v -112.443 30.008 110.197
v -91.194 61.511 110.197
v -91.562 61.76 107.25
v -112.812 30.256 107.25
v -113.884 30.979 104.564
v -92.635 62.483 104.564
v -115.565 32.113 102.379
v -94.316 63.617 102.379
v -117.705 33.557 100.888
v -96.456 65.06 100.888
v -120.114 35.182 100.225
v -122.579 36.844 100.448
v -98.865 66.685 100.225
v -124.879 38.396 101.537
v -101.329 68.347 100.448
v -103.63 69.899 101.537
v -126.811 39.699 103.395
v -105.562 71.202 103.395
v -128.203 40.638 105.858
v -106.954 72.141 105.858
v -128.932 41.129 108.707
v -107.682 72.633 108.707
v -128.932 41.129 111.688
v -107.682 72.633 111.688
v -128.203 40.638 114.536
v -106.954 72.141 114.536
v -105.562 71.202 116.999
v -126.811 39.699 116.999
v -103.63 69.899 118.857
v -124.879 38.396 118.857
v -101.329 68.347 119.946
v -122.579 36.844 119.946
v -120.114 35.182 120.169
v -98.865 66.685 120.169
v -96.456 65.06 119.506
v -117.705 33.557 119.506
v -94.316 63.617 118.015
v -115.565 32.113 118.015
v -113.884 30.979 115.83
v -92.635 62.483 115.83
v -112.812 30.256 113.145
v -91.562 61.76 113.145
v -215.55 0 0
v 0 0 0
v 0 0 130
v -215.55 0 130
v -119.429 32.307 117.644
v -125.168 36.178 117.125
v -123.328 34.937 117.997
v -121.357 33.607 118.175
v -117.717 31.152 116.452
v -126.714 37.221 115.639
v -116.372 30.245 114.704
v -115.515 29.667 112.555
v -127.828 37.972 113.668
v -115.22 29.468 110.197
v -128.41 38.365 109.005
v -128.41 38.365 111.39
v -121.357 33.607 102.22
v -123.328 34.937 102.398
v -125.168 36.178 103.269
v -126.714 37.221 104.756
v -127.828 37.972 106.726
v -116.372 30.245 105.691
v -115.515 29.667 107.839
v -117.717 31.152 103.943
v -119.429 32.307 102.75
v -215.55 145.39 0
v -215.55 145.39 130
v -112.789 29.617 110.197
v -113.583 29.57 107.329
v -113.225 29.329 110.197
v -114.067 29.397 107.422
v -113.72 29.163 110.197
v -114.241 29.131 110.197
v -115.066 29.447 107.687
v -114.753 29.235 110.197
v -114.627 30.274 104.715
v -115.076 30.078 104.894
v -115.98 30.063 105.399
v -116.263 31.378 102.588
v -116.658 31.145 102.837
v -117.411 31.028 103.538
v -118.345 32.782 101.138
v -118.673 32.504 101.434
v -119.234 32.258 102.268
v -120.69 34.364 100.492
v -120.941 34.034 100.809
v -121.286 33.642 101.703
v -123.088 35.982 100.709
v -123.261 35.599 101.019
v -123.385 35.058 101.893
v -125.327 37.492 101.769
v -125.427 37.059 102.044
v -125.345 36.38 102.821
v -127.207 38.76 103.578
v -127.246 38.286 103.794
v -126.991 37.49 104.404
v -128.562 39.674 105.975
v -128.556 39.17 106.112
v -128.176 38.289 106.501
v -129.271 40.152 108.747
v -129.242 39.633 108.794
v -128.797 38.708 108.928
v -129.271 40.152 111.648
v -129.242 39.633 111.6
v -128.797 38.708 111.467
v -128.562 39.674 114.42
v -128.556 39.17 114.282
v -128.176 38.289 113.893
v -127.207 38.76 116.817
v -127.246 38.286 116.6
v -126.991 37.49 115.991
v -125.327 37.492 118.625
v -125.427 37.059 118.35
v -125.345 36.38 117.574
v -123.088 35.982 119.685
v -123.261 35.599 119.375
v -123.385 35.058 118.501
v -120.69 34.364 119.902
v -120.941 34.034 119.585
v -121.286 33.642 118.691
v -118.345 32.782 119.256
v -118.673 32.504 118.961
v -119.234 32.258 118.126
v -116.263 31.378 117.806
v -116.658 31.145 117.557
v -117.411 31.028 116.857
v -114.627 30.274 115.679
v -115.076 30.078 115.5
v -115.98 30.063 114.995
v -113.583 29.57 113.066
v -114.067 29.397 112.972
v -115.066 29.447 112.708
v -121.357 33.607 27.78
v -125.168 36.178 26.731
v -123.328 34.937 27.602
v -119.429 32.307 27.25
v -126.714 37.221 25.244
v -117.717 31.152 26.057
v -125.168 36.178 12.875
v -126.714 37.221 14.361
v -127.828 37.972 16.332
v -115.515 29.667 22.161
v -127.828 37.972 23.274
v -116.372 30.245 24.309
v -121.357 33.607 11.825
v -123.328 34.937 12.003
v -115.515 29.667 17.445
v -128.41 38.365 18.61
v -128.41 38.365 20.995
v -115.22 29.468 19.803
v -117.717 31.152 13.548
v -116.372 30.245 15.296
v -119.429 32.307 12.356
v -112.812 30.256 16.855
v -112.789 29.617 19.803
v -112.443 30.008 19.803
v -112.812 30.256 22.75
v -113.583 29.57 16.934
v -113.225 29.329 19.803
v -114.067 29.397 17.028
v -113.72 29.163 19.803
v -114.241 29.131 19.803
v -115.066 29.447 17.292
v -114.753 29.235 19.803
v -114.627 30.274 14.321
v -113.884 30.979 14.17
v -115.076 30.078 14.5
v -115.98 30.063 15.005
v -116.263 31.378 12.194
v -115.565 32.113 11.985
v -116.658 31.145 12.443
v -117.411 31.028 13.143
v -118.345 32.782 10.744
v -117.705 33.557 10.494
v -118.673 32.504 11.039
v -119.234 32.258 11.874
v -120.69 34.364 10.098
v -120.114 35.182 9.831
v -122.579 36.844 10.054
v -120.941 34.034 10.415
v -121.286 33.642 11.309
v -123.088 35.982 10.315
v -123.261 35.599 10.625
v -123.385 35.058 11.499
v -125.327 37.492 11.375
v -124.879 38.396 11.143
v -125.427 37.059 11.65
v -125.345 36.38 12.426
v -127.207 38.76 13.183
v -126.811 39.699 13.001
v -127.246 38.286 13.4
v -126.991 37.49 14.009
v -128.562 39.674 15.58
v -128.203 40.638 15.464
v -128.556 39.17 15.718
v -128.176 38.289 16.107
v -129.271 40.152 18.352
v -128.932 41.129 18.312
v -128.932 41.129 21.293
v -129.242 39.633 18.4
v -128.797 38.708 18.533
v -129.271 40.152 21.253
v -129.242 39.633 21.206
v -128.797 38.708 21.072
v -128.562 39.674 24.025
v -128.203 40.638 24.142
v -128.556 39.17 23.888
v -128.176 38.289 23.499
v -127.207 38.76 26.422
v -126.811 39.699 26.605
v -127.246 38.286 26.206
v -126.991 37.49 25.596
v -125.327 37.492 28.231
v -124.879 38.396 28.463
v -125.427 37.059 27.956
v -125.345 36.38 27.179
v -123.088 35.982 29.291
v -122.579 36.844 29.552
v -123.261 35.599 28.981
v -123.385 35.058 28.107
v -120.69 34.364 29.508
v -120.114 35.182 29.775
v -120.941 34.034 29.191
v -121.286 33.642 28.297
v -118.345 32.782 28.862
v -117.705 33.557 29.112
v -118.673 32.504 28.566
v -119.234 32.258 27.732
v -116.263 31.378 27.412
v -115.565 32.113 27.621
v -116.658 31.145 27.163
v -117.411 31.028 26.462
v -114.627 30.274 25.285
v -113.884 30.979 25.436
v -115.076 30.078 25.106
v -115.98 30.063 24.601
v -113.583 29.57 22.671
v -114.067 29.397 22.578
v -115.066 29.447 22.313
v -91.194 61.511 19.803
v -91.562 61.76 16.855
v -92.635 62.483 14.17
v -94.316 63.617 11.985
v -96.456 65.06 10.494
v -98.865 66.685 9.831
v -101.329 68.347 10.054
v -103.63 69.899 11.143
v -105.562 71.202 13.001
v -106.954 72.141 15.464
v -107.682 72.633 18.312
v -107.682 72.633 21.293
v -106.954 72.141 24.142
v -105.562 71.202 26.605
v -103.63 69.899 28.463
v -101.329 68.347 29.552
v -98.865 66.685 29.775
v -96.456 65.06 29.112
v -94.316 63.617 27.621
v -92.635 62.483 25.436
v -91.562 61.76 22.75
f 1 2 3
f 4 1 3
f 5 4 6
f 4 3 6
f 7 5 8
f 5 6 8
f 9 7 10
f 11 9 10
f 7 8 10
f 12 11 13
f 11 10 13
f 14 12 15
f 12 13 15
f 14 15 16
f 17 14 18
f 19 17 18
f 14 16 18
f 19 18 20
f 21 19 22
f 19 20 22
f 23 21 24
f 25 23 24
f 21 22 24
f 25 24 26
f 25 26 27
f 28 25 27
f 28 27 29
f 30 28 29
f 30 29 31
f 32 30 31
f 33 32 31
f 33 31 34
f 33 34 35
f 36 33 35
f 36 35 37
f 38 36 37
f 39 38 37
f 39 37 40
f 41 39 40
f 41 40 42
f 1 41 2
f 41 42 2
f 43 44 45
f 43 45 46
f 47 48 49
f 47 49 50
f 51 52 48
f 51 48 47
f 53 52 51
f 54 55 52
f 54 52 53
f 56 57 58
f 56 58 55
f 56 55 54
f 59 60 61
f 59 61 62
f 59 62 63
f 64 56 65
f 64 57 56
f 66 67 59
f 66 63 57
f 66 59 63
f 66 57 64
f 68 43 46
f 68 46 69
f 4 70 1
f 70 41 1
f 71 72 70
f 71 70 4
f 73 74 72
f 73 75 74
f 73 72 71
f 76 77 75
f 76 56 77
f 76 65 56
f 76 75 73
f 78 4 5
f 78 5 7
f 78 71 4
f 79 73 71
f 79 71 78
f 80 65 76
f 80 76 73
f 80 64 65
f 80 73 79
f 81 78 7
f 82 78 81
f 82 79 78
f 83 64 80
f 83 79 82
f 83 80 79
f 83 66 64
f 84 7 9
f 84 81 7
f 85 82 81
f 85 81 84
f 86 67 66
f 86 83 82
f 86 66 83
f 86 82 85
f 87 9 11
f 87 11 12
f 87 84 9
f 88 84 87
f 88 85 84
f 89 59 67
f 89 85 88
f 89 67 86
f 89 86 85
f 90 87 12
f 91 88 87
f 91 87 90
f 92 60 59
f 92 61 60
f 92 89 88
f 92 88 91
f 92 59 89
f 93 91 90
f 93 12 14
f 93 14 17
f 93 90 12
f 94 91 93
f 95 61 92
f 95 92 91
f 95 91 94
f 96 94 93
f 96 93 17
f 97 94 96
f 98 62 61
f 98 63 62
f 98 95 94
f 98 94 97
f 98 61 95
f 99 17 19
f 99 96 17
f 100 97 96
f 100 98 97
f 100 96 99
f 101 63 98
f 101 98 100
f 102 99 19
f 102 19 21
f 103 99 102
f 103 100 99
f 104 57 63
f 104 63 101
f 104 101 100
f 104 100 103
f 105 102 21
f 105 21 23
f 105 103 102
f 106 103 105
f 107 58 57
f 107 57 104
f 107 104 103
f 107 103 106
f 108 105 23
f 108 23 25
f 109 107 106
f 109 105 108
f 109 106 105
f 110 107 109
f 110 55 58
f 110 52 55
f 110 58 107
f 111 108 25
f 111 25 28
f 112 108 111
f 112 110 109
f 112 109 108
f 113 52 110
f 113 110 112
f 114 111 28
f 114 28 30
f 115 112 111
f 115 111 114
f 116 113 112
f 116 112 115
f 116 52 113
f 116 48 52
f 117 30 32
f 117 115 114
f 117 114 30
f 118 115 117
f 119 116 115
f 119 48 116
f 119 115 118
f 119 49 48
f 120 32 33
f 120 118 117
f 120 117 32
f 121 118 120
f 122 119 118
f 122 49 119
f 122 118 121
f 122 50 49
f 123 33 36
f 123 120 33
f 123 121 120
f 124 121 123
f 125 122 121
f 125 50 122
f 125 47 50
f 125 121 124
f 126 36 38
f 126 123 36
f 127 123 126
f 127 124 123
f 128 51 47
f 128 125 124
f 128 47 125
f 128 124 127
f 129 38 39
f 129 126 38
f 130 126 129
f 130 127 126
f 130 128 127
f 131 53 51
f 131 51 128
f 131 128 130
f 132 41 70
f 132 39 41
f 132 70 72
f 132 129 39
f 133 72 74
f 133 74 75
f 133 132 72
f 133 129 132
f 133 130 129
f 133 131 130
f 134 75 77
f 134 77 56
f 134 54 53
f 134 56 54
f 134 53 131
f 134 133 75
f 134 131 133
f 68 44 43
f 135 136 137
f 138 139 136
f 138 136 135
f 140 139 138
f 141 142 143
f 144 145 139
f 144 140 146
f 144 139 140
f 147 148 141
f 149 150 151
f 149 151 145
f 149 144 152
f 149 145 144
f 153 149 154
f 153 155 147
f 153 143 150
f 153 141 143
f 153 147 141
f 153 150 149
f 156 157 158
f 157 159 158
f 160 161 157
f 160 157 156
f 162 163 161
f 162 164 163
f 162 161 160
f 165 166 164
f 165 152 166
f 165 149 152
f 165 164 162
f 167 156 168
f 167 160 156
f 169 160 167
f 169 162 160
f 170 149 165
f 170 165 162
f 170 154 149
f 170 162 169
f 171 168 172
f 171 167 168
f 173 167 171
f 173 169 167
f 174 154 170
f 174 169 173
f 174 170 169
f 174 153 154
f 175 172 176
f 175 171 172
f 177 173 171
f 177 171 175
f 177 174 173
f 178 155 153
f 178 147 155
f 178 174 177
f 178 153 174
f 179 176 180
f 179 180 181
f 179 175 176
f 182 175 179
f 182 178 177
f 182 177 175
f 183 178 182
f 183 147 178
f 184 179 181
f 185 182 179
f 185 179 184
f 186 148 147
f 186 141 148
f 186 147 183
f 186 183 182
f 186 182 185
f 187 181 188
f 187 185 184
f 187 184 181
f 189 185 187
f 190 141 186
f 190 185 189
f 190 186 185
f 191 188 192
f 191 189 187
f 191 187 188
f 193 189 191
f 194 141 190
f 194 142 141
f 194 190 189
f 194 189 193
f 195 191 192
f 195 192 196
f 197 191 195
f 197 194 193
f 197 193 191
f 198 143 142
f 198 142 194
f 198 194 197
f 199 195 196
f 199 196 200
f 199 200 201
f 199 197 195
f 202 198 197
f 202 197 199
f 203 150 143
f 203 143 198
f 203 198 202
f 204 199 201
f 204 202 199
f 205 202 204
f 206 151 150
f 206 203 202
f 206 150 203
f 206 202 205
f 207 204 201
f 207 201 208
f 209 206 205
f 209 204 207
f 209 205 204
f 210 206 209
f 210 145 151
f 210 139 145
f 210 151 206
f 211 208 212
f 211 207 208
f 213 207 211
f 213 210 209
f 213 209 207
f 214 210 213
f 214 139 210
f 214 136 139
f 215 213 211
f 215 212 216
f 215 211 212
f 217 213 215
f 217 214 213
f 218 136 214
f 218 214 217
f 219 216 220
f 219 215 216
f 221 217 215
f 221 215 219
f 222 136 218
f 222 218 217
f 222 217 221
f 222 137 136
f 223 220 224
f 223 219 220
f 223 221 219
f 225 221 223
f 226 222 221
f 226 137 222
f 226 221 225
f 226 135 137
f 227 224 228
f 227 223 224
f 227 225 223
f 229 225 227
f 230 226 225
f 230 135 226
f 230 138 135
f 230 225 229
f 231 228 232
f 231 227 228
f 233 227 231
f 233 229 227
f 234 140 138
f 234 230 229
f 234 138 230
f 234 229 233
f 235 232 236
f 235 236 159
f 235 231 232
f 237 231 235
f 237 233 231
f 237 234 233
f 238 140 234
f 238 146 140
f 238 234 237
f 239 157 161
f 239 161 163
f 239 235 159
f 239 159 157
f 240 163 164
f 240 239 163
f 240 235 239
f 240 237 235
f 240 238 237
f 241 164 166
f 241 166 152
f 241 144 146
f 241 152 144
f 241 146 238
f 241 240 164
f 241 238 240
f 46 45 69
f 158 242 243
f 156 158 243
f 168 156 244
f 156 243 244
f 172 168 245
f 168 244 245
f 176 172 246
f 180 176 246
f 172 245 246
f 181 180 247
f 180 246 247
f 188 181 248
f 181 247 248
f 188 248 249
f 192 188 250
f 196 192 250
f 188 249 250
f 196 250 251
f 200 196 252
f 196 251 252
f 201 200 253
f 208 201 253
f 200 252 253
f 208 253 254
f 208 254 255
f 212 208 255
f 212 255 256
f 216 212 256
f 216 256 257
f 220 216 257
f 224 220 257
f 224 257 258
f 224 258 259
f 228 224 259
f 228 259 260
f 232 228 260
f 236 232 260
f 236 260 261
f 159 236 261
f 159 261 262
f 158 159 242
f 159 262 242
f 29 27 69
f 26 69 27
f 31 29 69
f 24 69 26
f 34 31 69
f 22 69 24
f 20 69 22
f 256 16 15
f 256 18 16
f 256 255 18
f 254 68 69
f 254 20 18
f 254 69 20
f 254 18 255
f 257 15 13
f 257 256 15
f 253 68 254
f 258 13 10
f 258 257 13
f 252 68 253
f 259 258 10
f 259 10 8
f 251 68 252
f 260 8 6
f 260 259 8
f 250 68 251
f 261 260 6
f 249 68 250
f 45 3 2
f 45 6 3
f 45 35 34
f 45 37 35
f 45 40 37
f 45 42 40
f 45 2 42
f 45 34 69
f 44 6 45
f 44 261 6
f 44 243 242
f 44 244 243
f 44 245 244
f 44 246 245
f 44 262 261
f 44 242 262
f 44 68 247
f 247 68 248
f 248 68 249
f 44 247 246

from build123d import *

# Parameters (mm, degrees)
BOSS_EXTRU_1_DEPTH      = 130
ESQUISSE3_R             = 10
ENL_V_MAT_EXTRU_1_DEPTH = 40
CONG_1_R                = 2
CONG_2_R                = 2


with BuildPart() as part:
    # Esquisse2 → Boss.-Extru.1 (new body)
    with BuildSketch(Plane.XY):
        Polygon((0, 0), (-215.549768864, 0), (-215.549768864, 145.390154902), align=None)
    extrude(amount=BOSS_EXTRU_1_DEPTH)

    # Esquisse3 → Enlèv. mat.-Extru.1 (cut)
    with BuildSketch(Plane(origin=(0, 0, 0), x_dir=(0.829037573, -0.559192903, 0), z_dir=(0.559192903, 0.829037573, 0))):
        with Locations((-120, -19.80283687)):
            Circle(ESQUISSE3_R)
        with Locations((-120, -110.19716313)):
            Circle(ESQUISSE3_R)
    extrude(amount=-ENL_V_MAT_EXTRU_1_DEPTH, mode=Mode.SUBTRACT)

    # Congé1
    cong_1_edges = [part.edges().sort_by_distance(p)[0] for p in [
        (-130.142600571, 39.533574549, 19.80283687),
    ]]
    fillet(cong_1_edges, radius=CONG_1_R)

    # Congé2
    cong_2_edges = [part.edges().sort_by_distance(p)[0] for p in [
        (-130.142600571, 39.533574549, 110.19716313),
    ]]
    fillet(cong_2_edges, radius=CONG_2_R)


solid = part.part
